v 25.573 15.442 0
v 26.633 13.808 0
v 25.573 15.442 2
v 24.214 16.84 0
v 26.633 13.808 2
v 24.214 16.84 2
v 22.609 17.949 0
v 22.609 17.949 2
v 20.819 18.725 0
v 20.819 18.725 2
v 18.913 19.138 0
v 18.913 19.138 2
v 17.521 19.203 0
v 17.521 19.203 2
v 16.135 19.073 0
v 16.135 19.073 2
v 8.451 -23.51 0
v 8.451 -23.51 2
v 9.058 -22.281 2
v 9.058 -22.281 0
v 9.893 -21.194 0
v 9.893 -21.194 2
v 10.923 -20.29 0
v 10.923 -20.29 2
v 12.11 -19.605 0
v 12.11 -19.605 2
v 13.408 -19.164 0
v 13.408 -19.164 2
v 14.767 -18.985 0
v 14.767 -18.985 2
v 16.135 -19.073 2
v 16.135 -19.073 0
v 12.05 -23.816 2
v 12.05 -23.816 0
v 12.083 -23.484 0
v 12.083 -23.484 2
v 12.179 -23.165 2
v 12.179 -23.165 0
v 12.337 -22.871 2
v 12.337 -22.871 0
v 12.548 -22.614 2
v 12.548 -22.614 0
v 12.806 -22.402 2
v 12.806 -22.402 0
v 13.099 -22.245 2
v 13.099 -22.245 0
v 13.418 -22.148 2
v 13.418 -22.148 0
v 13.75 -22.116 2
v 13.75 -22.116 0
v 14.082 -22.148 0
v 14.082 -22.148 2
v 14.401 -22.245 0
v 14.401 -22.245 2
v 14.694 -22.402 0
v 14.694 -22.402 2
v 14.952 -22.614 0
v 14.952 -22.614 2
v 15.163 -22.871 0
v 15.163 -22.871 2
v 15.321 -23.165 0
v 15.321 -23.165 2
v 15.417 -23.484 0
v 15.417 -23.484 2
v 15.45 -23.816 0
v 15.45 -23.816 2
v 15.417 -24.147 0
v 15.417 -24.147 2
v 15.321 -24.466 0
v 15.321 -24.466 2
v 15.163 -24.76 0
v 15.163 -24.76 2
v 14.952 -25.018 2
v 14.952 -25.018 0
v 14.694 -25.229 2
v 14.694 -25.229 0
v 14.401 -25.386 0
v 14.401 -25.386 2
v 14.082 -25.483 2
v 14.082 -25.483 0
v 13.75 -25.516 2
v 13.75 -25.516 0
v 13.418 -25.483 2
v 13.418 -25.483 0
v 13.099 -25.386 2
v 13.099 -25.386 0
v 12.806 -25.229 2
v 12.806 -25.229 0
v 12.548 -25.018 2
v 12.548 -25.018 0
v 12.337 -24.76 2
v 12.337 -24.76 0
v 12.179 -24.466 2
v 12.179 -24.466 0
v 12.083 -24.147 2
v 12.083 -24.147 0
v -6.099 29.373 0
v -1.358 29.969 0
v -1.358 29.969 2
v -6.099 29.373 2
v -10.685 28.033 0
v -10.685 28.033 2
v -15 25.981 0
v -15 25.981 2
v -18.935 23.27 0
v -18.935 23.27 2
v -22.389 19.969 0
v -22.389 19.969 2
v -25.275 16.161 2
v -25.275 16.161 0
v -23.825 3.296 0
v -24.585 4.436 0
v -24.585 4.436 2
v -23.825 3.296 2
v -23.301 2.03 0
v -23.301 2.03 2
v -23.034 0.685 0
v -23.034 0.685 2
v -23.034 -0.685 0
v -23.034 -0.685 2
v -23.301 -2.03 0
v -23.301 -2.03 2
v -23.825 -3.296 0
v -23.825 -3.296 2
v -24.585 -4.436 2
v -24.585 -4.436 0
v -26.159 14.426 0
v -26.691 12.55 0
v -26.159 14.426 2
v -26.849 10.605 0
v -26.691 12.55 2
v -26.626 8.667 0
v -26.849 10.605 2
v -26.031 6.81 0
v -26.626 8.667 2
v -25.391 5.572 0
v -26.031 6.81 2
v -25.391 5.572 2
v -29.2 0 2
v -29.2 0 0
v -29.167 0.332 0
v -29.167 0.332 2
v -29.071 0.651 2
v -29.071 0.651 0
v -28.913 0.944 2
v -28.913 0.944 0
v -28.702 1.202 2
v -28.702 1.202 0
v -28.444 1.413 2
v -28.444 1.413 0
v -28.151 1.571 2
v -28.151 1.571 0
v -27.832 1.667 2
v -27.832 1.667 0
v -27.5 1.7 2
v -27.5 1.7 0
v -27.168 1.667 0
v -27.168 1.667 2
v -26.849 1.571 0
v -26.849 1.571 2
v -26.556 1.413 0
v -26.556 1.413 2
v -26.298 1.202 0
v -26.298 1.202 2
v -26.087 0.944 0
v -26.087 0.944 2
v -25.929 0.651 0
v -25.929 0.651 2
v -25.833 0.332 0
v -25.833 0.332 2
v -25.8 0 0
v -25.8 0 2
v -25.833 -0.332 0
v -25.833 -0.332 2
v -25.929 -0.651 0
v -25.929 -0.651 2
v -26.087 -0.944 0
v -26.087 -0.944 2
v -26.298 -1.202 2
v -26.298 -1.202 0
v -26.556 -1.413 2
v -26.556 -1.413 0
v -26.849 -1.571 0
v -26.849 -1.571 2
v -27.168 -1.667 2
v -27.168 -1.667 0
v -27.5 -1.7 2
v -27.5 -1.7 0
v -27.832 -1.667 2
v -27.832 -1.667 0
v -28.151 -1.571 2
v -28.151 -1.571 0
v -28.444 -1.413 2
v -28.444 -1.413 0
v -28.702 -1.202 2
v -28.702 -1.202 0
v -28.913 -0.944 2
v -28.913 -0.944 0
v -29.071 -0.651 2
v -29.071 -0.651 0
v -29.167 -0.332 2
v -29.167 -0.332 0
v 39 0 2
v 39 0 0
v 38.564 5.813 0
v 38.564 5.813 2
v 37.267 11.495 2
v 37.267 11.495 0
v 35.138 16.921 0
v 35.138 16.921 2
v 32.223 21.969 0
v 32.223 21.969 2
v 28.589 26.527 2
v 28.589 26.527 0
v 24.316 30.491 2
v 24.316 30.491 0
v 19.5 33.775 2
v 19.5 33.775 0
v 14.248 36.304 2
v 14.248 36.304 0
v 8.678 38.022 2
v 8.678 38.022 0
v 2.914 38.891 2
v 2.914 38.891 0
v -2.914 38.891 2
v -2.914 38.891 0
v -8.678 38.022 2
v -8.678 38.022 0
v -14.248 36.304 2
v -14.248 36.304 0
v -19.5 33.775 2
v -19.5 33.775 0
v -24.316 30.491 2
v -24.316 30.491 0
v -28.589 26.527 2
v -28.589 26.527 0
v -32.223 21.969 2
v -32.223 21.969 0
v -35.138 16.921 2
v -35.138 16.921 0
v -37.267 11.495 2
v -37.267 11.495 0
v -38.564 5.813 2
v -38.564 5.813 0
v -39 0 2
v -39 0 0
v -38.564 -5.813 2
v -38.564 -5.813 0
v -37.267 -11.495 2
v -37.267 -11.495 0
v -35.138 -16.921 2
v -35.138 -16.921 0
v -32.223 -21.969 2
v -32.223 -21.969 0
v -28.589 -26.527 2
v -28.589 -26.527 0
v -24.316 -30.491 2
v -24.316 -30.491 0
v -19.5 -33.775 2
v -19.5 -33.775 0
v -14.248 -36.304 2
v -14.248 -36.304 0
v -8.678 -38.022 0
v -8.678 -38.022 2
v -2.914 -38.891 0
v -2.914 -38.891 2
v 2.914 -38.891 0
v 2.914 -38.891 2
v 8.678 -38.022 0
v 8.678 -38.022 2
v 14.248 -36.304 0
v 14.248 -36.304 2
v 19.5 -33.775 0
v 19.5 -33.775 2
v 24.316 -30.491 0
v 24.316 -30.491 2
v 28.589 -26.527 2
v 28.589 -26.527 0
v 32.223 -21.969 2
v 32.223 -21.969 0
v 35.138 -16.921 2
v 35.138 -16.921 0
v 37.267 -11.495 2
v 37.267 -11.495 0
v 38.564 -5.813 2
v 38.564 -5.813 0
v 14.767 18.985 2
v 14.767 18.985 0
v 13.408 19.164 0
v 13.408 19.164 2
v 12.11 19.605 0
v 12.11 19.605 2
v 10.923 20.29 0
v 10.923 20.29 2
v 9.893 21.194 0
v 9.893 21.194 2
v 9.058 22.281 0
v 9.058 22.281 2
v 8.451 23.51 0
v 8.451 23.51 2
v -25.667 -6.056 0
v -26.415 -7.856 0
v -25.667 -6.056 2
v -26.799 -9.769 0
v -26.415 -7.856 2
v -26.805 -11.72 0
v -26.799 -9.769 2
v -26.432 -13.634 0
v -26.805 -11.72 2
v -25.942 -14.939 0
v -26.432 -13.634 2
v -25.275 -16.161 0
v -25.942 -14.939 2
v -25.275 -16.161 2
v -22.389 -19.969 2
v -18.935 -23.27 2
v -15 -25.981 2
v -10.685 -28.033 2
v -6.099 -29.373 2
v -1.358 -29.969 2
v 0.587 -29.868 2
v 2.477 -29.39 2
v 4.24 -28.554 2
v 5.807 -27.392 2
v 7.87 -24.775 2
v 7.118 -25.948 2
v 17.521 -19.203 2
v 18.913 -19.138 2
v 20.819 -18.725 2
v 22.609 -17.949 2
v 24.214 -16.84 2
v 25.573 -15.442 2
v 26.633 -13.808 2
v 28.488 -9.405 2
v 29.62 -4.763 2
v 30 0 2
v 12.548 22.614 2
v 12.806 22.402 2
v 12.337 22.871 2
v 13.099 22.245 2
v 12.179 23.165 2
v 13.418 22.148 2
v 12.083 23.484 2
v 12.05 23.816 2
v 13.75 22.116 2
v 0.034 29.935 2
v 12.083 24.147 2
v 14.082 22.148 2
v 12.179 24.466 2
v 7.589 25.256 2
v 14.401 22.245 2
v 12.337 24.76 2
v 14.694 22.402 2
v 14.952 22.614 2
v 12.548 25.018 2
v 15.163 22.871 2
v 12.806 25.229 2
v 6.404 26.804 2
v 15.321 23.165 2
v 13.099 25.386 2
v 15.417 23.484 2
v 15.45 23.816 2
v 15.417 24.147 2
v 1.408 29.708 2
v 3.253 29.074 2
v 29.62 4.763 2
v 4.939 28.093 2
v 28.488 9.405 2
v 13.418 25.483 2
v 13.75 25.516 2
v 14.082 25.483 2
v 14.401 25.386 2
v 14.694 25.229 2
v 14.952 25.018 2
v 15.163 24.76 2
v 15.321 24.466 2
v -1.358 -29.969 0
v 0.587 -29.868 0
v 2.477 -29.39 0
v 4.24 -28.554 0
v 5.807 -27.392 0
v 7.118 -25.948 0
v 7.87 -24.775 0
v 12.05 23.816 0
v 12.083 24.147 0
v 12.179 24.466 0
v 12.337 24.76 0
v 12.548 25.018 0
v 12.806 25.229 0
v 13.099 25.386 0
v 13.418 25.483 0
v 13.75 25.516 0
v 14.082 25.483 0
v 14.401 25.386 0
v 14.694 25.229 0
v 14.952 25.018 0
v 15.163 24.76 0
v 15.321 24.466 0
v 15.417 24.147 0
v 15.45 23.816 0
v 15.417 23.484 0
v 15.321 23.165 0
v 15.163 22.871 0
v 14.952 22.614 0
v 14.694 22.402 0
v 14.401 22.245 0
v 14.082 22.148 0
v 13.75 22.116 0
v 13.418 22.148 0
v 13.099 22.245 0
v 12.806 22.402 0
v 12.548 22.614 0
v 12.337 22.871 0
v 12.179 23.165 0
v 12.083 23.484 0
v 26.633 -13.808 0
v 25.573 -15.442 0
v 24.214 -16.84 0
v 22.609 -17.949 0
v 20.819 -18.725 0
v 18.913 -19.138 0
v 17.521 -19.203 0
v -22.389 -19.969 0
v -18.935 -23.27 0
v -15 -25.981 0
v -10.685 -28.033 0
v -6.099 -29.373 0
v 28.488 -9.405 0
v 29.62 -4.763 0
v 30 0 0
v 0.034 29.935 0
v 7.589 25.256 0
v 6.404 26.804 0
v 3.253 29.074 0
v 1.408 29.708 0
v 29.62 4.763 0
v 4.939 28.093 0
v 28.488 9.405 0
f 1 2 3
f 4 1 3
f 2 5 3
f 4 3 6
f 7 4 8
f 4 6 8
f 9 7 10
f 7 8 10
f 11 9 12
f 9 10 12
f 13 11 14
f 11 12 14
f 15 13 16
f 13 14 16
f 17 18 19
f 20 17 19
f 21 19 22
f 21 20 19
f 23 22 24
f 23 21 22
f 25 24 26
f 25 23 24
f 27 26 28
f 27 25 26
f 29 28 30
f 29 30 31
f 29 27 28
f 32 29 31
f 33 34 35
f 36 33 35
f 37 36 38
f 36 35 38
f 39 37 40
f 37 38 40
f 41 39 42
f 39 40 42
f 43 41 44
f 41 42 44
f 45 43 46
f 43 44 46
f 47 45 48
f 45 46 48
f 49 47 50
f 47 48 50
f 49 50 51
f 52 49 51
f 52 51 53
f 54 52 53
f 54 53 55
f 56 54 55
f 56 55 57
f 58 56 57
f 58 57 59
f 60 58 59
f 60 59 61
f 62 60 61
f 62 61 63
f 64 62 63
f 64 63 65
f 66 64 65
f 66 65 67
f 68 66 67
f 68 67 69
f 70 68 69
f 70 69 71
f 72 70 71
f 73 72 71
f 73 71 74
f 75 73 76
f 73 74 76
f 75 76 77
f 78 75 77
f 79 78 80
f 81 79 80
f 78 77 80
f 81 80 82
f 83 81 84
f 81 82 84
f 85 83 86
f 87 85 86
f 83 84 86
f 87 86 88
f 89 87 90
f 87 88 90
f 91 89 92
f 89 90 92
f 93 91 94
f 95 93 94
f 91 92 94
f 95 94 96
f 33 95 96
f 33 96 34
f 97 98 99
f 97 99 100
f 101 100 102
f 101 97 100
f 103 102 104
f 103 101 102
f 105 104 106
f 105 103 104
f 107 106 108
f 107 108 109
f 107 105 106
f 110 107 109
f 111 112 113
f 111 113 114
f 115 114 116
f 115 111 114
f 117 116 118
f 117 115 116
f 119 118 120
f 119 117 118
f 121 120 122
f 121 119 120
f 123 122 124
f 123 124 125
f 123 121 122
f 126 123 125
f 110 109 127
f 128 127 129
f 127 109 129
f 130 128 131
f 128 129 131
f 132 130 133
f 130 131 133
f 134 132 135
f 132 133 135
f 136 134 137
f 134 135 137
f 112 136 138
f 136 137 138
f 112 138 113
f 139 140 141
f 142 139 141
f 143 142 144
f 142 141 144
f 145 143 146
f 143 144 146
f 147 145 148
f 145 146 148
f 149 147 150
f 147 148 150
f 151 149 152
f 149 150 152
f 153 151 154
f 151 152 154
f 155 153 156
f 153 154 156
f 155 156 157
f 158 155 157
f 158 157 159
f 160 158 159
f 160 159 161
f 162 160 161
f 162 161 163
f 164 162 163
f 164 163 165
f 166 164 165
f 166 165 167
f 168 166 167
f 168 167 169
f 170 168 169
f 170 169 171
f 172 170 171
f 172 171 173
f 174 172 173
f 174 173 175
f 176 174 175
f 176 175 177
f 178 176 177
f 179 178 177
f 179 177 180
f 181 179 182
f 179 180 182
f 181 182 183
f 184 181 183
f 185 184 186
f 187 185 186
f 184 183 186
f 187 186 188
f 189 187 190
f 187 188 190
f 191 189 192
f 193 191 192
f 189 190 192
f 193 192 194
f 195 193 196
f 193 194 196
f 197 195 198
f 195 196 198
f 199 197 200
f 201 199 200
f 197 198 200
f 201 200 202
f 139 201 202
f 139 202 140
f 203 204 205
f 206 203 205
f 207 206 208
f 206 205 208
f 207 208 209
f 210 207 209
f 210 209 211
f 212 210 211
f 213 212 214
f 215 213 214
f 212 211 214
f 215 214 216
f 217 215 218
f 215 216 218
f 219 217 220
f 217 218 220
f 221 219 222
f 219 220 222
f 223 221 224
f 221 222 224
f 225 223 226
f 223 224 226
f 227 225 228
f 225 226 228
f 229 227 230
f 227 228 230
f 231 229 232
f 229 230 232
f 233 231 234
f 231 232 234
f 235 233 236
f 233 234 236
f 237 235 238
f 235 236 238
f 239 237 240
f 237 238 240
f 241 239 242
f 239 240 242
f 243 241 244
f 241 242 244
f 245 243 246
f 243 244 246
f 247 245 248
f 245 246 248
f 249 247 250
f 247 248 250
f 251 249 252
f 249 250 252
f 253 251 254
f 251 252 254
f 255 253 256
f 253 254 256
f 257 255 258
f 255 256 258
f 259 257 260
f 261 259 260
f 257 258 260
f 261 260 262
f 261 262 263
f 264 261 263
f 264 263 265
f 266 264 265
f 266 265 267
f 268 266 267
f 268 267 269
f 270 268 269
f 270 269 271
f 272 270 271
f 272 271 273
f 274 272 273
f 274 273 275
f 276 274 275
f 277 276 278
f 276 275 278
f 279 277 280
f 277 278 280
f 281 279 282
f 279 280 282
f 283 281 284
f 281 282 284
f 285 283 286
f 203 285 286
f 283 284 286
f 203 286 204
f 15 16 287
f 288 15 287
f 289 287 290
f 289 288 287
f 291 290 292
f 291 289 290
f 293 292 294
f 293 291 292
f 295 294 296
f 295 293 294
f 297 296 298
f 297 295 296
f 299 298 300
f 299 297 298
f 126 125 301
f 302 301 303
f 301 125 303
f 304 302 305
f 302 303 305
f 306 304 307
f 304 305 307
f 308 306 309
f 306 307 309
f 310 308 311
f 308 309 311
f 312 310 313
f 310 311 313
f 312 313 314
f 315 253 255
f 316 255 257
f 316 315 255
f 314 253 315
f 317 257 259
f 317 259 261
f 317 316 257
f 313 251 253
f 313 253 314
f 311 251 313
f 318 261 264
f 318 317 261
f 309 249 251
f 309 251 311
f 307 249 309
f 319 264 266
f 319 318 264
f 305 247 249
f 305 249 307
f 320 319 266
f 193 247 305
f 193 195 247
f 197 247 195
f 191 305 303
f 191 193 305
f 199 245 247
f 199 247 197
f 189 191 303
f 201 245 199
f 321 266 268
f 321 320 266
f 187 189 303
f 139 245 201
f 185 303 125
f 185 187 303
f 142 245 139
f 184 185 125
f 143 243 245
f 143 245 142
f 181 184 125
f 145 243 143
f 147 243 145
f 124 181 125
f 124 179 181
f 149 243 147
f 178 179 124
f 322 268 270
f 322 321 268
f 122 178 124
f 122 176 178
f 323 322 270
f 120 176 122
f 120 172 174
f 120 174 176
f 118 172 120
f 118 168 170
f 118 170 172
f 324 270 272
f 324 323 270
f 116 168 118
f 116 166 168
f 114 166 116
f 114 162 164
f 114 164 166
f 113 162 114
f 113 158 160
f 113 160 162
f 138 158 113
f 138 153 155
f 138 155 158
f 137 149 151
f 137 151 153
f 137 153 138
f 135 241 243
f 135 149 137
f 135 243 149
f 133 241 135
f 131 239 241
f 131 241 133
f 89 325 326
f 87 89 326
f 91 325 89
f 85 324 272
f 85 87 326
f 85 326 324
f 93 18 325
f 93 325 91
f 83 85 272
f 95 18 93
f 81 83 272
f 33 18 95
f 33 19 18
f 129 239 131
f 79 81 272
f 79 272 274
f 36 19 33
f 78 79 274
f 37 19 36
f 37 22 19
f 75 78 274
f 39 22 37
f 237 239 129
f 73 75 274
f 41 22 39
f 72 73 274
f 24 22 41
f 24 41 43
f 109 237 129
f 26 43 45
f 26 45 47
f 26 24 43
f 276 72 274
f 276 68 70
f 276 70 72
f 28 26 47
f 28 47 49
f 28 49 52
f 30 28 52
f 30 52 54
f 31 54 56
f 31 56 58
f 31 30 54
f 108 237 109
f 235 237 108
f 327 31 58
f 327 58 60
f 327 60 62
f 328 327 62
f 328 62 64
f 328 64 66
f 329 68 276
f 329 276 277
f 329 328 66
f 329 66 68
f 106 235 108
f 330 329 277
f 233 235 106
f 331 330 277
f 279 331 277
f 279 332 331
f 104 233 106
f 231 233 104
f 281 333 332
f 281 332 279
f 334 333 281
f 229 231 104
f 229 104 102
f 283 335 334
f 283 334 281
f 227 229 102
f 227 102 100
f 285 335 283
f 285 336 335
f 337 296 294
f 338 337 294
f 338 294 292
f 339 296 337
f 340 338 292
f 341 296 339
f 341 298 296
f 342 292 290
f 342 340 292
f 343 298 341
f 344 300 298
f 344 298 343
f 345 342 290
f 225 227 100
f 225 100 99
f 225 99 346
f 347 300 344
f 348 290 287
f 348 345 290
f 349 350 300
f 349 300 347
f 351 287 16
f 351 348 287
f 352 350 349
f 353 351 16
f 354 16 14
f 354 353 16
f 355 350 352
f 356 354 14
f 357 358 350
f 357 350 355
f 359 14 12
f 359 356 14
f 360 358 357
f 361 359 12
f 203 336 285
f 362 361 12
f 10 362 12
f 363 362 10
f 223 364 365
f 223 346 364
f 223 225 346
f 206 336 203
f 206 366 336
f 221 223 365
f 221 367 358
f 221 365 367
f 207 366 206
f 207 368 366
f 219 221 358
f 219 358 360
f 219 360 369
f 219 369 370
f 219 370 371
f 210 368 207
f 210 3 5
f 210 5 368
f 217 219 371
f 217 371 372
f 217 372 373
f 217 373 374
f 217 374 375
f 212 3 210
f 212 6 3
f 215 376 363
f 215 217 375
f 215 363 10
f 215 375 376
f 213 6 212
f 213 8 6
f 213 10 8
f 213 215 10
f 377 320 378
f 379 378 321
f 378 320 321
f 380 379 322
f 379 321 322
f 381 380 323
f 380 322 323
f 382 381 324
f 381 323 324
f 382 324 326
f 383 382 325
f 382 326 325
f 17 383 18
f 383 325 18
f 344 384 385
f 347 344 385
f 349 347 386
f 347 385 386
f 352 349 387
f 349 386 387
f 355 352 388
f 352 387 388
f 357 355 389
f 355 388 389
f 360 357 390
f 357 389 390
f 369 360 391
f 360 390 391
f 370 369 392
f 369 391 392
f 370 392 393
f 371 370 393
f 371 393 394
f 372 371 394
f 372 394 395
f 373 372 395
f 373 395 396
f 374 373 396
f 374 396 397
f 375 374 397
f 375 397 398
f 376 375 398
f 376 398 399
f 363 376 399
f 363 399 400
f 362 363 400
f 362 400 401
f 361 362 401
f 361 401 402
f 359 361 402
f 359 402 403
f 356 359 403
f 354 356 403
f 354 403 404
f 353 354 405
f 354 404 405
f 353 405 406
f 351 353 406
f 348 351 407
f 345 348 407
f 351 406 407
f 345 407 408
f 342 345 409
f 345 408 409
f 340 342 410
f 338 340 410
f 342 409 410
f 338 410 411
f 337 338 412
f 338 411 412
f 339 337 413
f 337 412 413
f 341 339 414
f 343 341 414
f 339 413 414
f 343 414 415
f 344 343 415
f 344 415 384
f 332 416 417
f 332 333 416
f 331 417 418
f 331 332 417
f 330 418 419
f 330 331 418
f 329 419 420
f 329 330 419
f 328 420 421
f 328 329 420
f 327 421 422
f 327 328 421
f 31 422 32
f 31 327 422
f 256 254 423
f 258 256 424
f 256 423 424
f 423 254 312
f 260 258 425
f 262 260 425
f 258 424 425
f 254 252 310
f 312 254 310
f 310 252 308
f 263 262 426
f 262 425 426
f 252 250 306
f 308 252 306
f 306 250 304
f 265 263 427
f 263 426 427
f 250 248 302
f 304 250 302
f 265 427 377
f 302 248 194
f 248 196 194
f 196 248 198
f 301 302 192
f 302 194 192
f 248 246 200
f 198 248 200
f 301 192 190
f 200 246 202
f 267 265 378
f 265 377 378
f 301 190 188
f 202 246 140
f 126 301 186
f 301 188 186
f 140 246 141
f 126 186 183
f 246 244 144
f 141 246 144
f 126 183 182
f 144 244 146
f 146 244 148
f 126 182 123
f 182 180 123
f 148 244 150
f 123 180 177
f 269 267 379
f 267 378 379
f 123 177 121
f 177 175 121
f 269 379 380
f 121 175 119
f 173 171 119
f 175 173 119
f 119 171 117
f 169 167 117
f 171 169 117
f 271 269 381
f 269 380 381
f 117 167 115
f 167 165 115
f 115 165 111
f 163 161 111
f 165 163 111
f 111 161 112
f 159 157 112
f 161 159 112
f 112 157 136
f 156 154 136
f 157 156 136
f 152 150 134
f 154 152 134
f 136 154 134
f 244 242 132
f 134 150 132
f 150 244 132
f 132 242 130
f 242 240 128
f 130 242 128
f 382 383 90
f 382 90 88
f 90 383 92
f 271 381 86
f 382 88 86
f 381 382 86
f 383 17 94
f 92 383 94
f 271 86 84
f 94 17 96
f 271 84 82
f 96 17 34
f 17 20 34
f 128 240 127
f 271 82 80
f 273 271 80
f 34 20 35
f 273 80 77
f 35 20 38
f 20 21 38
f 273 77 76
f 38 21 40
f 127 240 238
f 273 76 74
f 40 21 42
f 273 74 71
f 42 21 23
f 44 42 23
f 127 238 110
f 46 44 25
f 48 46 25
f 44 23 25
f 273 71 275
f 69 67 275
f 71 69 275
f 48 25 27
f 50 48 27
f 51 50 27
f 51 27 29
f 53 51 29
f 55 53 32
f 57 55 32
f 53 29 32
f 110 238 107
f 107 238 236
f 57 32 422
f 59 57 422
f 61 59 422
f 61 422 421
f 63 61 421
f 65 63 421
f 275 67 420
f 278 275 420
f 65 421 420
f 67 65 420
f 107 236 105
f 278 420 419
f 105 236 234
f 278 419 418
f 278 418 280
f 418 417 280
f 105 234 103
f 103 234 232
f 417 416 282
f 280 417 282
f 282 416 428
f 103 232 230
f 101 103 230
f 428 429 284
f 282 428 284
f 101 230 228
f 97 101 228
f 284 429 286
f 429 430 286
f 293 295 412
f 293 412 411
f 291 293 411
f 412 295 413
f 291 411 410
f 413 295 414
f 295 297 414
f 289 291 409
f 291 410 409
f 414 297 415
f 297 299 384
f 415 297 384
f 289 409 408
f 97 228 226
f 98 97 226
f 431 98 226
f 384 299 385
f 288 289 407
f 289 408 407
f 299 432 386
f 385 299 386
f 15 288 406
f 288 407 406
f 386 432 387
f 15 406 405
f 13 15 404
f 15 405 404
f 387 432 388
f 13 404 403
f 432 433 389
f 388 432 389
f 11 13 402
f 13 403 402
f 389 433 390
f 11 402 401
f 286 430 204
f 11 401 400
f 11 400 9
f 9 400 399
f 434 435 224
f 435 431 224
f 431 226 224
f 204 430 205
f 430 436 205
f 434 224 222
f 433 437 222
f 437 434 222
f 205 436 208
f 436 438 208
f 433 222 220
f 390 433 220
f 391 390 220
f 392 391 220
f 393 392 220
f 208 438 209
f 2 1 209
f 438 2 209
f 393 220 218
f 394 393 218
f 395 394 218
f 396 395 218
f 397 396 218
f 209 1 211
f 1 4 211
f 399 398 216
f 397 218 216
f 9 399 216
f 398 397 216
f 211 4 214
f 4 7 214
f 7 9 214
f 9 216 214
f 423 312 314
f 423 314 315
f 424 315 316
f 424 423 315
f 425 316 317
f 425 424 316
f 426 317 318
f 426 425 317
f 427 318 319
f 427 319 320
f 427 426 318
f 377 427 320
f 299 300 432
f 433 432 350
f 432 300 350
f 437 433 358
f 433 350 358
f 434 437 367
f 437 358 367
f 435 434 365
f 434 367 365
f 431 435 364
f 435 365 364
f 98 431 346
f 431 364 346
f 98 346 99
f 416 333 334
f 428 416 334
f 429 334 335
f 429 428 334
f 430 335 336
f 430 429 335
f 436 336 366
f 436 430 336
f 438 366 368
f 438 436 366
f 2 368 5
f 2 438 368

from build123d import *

# Parameters (mm, degrees)
SKETCH_1_R        = 39
EXTRUDE_1_DEPTH   = 2
FILLET_1_R        = 10
HOLE_WIZARD_M31_D = 3.4


with BuildPart() as part:
    # Эскиз1 → Бобышка-Вытянуть1 (new body)
    with BuildSketch(Plane.XY):
        Circle(SKETCH_1_R)
        with BuildLine():
            ThreePointArc((20.612446655, -21.797409087), (30, 0), (20.612446655, 21.797409087))
            ThreePointArc((20.612446655, 21.797409087), (11.5, 19.918584287), (8.570886678, 28.749606981))
            ThreePointArc((8.570886678, 28.749606981), (-15, 25.980762114), (-29.183333333, 6.952197894))
            ThreePointArc((-29.183333333, 6.952197894), (-23, 0), (-29.183333333, -6.952197894))
            ThreePointArc((-29.183333333, -6.952197894), (-15, -25.980762114), (8.570886678, -28.749606981))
            ThreePointArc((8.570886678, -28.749606981), (11.5, -19.918584287), (20.612446655, -21.797409087))
        make_face(mode=Mode.SUBTRACT)
    extrude(amount=EXTRUDE_1_DEPTH)

    # Скругление1
    fillet_1_edges = [part.edges().sort_by_distance(p)[0] for p in [
        (-29.183333333, 6.952197894, 1),
        (-29.183333333, -6.952197894, 1),
        (8.570886678, -28.749606981, 1),
        (20.612446655, -21.797409087, 1),
        (20.612446655, 21.797409087, 1),
        (8.570886678, 28.749606981, 1),
    ]]
    fillet(fillet_1_edges, radius=FILLET_1_R)

    # Отверстие с зазором M31 (through all)
    with Locations(Plane.XY.offset(2)):
        with Locations((13.75, 23.815698604), (-27.5, 0), (13.75, -23.815698604)):
            Hole(HOLE_WIZARD_M31_D / 2)


solid = part.part
